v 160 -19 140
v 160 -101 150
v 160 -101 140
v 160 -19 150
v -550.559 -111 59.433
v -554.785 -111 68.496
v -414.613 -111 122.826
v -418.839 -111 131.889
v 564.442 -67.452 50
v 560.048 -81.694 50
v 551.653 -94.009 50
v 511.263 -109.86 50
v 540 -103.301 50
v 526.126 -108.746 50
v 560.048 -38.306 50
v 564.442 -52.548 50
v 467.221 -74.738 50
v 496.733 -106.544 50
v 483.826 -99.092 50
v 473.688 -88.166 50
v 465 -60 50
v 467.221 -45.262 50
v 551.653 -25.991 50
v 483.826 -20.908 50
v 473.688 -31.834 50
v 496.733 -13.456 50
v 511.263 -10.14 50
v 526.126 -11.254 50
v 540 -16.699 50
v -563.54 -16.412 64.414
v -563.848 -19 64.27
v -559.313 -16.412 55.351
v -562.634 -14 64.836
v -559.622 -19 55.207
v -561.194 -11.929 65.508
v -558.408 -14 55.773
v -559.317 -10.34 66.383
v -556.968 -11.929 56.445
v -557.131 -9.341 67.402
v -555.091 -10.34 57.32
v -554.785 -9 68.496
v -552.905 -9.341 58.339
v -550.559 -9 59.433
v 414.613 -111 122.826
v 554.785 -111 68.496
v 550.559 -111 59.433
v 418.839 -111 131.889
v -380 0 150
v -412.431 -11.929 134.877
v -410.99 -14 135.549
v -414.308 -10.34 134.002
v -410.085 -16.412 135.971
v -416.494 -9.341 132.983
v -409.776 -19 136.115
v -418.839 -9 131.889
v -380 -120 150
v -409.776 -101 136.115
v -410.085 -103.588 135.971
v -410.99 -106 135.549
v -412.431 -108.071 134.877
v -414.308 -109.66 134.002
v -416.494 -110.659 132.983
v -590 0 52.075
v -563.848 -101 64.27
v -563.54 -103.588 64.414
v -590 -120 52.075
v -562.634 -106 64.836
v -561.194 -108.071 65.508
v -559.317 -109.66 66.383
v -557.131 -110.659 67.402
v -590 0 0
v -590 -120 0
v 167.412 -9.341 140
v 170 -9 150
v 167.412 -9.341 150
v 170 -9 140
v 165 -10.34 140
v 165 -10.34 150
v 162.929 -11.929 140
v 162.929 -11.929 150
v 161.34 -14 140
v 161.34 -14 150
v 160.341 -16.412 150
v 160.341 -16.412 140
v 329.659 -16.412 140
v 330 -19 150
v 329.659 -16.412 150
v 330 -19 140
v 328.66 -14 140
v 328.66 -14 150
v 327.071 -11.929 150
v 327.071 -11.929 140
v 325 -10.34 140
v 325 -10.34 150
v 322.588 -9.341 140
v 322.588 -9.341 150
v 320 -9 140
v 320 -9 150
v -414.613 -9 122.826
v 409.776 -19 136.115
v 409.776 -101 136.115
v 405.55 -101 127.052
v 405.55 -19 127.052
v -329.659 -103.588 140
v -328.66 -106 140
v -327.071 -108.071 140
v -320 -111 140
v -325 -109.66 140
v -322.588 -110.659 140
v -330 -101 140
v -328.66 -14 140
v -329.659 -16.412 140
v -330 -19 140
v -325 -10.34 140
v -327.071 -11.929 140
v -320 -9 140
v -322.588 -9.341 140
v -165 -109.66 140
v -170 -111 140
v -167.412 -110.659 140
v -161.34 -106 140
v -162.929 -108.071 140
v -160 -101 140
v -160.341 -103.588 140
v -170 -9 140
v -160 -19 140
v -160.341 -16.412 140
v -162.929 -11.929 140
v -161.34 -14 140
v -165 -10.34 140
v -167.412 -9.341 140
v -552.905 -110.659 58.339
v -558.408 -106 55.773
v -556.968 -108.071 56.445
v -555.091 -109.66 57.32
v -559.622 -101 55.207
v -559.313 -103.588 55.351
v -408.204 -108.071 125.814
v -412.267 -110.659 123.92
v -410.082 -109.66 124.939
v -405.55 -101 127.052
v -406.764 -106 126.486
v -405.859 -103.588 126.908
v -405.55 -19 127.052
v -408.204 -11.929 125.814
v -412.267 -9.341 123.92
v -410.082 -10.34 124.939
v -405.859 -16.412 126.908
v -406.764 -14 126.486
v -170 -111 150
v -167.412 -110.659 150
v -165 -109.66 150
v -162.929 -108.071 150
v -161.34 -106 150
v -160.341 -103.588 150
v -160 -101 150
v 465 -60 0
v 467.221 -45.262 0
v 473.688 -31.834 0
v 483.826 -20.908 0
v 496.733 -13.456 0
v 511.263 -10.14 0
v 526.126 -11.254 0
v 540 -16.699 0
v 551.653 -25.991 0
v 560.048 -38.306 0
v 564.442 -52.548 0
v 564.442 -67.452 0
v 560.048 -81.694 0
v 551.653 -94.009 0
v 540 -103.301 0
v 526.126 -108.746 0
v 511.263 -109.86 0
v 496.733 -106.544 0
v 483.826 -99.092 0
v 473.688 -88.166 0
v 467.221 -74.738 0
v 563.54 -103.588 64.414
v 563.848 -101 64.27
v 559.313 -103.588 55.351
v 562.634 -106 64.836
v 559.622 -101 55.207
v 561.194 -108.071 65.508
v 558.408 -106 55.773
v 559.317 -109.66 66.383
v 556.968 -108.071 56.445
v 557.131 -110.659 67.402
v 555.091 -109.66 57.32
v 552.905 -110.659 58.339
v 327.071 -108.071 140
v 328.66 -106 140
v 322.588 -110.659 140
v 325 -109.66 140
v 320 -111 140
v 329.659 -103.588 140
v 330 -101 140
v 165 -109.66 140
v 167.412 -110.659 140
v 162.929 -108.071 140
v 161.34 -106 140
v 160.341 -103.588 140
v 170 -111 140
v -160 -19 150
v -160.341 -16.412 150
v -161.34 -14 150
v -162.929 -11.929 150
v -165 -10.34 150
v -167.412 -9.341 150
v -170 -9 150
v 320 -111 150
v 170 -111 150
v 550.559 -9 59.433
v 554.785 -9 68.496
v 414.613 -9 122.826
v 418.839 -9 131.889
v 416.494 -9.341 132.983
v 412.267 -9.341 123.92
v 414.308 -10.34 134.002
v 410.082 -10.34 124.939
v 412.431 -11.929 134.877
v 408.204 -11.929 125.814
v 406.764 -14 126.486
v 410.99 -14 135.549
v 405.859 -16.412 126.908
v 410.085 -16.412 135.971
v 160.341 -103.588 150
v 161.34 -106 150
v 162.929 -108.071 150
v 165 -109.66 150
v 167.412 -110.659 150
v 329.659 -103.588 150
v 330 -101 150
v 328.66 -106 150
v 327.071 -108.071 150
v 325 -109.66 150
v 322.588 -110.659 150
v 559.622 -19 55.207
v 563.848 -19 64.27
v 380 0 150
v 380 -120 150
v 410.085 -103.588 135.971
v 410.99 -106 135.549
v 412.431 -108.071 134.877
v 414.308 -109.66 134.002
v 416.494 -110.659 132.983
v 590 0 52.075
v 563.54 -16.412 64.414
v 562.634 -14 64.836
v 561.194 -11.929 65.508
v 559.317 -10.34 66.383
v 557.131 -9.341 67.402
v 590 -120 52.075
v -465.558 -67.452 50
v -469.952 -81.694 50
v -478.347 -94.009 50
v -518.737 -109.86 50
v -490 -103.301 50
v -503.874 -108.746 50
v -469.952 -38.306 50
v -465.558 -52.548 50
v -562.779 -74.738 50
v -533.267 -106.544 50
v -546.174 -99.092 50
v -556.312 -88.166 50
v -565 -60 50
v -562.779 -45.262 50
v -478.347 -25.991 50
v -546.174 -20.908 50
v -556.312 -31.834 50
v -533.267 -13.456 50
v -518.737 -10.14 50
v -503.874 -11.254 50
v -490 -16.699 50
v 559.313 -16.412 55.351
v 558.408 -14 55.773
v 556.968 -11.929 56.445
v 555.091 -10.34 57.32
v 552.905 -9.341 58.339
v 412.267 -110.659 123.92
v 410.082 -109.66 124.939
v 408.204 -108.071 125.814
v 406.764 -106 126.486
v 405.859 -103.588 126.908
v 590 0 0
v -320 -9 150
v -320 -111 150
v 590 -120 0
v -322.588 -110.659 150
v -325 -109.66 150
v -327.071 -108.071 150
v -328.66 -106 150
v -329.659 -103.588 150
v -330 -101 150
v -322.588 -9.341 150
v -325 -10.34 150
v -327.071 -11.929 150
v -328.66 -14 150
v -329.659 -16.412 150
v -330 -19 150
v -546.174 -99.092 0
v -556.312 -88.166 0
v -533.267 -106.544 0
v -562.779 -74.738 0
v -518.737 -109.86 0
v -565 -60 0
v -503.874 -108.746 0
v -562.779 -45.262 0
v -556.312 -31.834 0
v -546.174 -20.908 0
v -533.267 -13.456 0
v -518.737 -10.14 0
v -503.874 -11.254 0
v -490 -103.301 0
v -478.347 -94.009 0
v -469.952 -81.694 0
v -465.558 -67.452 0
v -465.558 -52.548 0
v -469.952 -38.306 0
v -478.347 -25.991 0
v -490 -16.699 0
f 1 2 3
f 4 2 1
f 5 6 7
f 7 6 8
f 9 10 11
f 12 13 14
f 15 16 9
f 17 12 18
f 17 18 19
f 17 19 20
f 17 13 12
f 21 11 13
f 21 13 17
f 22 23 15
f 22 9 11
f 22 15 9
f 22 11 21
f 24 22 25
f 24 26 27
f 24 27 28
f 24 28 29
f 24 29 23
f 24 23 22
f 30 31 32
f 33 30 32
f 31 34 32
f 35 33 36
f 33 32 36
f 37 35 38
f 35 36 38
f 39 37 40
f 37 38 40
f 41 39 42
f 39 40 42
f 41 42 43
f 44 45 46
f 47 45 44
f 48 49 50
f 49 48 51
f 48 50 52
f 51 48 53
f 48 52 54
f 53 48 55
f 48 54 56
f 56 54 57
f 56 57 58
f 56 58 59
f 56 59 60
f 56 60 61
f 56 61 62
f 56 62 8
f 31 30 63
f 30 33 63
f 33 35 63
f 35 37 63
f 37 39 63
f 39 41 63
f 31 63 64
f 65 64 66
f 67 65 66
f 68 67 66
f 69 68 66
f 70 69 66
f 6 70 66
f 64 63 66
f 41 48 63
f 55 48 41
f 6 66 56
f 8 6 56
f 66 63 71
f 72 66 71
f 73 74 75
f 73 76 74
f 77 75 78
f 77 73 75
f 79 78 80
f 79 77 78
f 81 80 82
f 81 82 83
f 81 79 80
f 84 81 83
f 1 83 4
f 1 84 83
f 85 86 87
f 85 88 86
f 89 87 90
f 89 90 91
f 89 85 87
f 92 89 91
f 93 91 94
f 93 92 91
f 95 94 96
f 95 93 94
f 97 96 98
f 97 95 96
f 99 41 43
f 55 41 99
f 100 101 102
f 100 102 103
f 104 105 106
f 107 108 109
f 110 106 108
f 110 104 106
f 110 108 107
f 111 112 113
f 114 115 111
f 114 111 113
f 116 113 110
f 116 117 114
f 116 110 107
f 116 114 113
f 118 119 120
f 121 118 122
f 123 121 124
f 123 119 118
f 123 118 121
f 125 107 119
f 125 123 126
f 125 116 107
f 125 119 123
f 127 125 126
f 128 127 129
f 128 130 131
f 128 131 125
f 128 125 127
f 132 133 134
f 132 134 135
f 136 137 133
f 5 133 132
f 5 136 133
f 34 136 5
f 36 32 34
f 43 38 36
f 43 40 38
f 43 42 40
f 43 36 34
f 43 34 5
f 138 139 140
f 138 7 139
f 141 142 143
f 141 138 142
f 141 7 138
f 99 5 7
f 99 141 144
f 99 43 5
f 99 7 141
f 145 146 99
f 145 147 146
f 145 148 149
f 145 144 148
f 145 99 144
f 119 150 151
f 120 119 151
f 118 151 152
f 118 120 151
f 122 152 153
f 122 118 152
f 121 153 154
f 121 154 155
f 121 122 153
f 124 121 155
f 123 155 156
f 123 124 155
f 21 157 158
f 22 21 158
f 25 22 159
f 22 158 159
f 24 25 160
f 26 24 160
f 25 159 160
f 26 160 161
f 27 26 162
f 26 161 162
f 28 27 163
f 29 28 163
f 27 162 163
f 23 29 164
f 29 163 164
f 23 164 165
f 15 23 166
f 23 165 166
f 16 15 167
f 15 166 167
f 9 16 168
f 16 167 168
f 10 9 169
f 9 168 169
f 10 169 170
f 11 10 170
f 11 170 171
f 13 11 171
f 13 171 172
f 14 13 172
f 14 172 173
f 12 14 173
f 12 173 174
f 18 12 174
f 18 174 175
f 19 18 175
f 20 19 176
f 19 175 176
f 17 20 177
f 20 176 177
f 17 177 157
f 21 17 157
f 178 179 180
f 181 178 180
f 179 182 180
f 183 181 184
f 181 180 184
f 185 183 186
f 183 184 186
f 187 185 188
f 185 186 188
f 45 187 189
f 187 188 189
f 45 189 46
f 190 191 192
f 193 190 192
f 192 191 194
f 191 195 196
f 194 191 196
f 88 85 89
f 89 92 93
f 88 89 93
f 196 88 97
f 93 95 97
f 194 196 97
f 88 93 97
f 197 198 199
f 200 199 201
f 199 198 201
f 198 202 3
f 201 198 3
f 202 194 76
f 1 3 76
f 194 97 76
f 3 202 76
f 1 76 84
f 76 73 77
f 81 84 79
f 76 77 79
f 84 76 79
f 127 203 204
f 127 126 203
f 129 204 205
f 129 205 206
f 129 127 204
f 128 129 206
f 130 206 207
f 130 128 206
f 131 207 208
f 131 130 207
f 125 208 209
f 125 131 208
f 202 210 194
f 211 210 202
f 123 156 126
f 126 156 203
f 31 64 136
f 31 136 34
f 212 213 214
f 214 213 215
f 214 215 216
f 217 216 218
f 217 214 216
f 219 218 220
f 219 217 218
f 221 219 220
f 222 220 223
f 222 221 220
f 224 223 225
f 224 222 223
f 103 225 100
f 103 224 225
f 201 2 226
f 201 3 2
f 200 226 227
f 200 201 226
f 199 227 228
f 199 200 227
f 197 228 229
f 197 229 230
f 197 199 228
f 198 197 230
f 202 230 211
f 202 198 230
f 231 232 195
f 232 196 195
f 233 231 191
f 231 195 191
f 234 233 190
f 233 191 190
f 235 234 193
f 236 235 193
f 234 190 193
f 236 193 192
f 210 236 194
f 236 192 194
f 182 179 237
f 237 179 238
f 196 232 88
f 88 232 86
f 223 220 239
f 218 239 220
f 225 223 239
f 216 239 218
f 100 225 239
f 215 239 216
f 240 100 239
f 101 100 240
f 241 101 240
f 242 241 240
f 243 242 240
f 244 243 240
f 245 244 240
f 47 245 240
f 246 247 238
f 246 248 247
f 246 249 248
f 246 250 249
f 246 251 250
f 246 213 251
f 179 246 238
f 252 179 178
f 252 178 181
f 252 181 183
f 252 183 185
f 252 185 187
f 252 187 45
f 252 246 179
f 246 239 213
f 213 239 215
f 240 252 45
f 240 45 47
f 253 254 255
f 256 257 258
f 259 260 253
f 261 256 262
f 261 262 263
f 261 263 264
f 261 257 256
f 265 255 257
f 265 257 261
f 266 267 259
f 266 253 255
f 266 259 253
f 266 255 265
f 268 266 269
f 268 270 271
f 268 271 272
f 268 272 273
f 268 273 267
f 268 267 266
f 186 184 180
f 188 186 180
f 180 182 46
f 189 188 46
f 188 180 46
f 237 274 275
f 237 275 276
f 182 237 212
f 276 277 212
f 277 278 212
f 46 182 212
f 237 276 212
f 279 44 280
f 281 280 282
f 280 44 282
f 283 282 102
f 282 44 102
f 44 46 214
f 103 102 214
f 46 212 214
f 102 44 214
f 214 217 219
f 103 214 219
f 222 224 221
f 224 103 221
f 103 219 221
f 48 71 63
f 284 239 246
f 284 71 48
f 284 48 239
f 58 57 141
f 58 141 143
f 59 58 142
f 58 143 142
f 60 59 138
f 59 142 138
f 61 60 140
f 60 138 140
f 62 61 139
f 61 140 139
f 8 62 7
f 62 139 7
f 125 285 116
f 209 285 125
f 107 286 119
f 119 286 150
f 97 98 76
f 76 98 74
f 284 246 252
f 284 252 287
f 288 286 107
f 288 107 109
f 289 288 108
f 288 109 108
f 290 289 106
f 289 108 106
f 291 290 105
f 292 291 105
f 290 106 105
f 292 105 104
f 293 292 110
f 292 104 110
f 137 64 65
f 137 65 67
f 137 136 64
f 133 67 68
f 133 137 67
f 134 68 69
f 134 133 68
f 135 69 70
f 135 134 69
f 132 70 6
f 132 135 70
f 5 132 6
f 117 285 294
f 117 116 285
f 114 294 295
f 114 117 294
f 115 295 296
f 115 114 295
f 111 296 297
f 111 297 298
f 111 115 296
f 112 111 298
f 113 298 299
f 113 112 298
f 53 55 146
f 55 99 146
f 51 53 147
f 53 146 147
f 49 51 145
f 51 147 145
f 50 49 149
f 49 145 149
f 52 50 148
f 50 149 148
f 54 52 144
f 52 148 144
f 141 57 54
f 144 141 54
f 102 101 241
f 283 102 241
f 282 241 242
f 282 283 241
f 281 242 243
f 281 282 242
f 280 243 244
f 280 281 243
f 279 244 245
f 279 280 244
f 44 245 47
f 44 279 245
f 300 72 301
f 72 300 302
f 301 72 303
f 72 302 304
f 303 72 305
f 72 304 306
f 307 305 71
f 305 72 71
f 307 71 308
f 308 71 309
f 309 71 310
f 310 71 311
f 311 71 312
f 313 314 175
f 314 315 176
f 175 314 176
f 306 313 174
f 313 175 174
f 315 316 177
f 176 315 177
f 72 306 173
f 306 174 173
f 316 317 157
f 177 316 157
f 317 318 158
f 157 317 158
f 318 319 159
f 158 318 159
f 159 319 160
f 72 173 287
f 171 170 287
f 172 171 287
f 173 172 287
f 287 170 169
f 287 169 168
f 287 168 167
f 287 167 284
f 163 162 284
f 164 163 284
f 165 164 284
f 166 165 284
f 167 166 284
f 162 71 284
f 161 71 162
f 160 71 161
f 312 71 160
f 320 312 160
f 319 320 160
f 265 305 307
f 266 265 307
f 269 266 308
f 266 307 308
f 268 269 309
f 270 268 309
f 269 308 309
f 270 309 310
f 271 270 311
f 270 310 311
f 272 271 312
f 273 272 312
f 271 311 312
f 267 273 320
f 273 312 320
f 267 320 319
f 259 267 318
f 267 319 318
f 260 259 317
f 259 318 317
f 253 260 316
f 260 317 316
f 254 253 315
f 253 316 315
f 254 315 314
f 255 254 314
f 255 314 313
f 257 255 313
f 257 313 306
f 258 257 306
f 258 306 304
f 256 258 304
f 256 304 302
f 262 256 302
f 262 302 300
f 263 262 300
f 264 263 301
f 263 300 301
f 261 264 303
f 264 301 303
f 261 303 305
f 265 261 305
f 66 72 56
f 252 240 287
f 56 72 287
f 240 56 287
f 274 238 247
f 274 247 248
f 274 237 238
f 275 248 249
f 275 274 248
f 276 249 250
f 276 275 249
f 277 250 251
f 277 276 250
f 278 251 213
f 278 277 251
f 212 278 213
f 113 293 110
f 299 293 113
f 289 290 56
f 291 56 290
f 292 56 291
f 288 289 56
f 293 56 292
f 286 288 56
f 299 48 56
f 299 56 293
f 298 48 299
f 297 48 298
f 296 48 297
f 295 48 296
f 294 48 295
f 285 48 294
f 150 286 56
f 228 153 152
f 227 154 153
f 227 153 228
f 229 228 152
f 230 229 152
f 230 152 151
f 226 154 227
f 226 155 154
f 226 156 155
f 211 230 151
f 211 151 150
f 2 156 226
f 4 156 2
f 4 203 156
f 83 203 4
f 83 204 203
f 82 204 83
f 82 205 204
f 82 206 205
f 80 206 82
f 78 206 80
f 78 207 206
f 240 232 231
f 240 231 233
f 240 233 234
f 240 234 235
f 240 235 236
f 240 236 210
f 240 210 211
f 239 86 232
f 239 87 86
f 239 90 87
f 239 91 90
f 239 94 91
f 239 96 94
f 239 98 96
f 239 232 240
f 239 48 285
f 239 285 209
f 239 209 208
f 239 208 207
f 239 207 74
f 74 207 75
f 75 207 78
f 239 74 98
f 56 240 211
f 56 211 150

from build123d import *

# Parameters (mm, degrees)
SKETCH1_W           = 1180
SKETCH1_H           = 150
BOSS_EXTRUDE1_DEPTH = 120
SKETCH2_R           = 50
CUT_EXTRUDE1_DEPTH  = 50
CHAMFER1_SIZE       = 210
CHAMFER1_SIZE2      = 97.924608213
SKETCH3_W           = 170
SKETCH3_H           = 102
CUT_EXTRUDE2_DEPTH  = 10
FILLET2_R           = 10
SKETCH4_W           = 170
SKETCH4_H           = 102
CUT_EXTRUDE3_DEPTH  = 10
FILLET3_R           = 10
FILLET4_R           = 10


with BuildPart() as part:
    # Sketch1 → Boss-Extrude1 (new body)
    with BuildSketch(Plane(origin=(0, 0, 0), x_dir=(1, 0, 0), z_dir=(0, 1, 0))):
        with Locations((0, -75)):
            Rectangle(SKETCH1_W, SKETCH1_H)
    extrude(amount=-BOSS_EXTRUDE1_DEPTH)

    # Sketch2 → Cut-Extrude1 (cut)
    with BuildSketch(Plane(origin=(0, 0, 0), x_dir=(-1, 0, 0), z_dir=(0, 0, -1))):
        with Locations((-515, -60)):
            Circle(SKETCH2_R)
        with Locations((515, -60)):
            Circle(SKETCH2_R)
    extrude(amount=-CUT_EXTRUDE1_DEPTH, mode=Mode.SUBTRACT)

    # Chamfer1
    chamfer1_edges = [part.edges().sort_by_distance(p)[0] for p in [
        (590, -60, 150),
        (-590, -60, 150),
    ]]
    chamfer1_side = [part.faces().sort_by_distance(p)[0] for p in [
        (0, -60, 150),
    ]]
    chamfer(chamfer1_edges, length=CHAMFER1_SIZE, length2=CHAMFER1_SIZE2, reference=chamfer1_side[0])

    # Sketch3 → Cut-Extrude2 (cut)
    with BuildSketch(Plane(origin=(-125.323687393, 0, 268.757514919), x_dir=(0.9063077870366509, 0, 0.42261826174069755), z_dir=(-0.4226182617406975, 0, 0.9063077870366508))):
        with Locations((-398.858582795, -60)):
            Rectangle(SKETCH3_W, SKETCH3_H)
    cut_extrude2 = extrude(amount=-CUT_EXTRUDE2_DEPTH, mode=Mode.SUBTRACT)

    # Fillet2
    fillet2_edges = [part.edges().sort_by_distance(p)[0] for p in [
        (-561.735397496, -111, 59.738502795),
        (-561.735397496, -9, 59.738502795),
        (-407.6630737, -9, 131.583607291),
        (-407.6630737, -111, 131.583607291),
    ]]
    fillet(fillet2_edges, radius=FILLET2_R)

    # Mirror1: Cut-Extrude2 across plane
    add(cut_extrude2.mirror(Plane(origin=(0, 0, 0), x_dir=(0, 0, 1), z_dir=(1, 0, 0))), mode=Mode.SUBTRACT)

    # Sketch4 → Cut-Extrude3 (cut)
    with BuildSketch(Plane.XY.offset(150)):
        with Locations((-245, -60)):
            Rectangle(SKETCH4_W, SKETCH4_H)
    cut_extrude3 = extrude(amount=-CUT_EXTRUDE3_DEPTH, mode=Mode.SUBTRACT)

    # Fillet3
    fillet3_edges = [part.edges().sort_by_distance(p)[0] for p in [
        (-330, -111, 145),
        (-330, -9, 145),
        (-160, -9, 145),
        (-160, -111, 145),
    ]]
    fillet(fillet3_edges, radius=FILLET3_R)

    # Mirror2: Cut-Extrude3 across plane
    add(cut_extrude3.mirror(Plane(origin=(0, 0, 0), x_dir=(0, 0, 1), z_dir=(1, 0, 0))), mode=Mode.SUBTRACT)

    # Fillet4
    fillet4_edges = [part.edges().sort_by_distance(p)[0] for p in [
        (330, -9, 145),
        (330, -111, 145),
        (160, -111, 145),
        (160, -9, 145),
        (561.735397496, -9, 59.738502795),
        (561.735397496, -111, 59.738502795),
        (407.6630737, -111, 131.583607291),
        (407.6630737, -9, 131.583607291),
    ]]
    fillet(fillet4_edges, radius=FILLET4_R)


solid = part.part
